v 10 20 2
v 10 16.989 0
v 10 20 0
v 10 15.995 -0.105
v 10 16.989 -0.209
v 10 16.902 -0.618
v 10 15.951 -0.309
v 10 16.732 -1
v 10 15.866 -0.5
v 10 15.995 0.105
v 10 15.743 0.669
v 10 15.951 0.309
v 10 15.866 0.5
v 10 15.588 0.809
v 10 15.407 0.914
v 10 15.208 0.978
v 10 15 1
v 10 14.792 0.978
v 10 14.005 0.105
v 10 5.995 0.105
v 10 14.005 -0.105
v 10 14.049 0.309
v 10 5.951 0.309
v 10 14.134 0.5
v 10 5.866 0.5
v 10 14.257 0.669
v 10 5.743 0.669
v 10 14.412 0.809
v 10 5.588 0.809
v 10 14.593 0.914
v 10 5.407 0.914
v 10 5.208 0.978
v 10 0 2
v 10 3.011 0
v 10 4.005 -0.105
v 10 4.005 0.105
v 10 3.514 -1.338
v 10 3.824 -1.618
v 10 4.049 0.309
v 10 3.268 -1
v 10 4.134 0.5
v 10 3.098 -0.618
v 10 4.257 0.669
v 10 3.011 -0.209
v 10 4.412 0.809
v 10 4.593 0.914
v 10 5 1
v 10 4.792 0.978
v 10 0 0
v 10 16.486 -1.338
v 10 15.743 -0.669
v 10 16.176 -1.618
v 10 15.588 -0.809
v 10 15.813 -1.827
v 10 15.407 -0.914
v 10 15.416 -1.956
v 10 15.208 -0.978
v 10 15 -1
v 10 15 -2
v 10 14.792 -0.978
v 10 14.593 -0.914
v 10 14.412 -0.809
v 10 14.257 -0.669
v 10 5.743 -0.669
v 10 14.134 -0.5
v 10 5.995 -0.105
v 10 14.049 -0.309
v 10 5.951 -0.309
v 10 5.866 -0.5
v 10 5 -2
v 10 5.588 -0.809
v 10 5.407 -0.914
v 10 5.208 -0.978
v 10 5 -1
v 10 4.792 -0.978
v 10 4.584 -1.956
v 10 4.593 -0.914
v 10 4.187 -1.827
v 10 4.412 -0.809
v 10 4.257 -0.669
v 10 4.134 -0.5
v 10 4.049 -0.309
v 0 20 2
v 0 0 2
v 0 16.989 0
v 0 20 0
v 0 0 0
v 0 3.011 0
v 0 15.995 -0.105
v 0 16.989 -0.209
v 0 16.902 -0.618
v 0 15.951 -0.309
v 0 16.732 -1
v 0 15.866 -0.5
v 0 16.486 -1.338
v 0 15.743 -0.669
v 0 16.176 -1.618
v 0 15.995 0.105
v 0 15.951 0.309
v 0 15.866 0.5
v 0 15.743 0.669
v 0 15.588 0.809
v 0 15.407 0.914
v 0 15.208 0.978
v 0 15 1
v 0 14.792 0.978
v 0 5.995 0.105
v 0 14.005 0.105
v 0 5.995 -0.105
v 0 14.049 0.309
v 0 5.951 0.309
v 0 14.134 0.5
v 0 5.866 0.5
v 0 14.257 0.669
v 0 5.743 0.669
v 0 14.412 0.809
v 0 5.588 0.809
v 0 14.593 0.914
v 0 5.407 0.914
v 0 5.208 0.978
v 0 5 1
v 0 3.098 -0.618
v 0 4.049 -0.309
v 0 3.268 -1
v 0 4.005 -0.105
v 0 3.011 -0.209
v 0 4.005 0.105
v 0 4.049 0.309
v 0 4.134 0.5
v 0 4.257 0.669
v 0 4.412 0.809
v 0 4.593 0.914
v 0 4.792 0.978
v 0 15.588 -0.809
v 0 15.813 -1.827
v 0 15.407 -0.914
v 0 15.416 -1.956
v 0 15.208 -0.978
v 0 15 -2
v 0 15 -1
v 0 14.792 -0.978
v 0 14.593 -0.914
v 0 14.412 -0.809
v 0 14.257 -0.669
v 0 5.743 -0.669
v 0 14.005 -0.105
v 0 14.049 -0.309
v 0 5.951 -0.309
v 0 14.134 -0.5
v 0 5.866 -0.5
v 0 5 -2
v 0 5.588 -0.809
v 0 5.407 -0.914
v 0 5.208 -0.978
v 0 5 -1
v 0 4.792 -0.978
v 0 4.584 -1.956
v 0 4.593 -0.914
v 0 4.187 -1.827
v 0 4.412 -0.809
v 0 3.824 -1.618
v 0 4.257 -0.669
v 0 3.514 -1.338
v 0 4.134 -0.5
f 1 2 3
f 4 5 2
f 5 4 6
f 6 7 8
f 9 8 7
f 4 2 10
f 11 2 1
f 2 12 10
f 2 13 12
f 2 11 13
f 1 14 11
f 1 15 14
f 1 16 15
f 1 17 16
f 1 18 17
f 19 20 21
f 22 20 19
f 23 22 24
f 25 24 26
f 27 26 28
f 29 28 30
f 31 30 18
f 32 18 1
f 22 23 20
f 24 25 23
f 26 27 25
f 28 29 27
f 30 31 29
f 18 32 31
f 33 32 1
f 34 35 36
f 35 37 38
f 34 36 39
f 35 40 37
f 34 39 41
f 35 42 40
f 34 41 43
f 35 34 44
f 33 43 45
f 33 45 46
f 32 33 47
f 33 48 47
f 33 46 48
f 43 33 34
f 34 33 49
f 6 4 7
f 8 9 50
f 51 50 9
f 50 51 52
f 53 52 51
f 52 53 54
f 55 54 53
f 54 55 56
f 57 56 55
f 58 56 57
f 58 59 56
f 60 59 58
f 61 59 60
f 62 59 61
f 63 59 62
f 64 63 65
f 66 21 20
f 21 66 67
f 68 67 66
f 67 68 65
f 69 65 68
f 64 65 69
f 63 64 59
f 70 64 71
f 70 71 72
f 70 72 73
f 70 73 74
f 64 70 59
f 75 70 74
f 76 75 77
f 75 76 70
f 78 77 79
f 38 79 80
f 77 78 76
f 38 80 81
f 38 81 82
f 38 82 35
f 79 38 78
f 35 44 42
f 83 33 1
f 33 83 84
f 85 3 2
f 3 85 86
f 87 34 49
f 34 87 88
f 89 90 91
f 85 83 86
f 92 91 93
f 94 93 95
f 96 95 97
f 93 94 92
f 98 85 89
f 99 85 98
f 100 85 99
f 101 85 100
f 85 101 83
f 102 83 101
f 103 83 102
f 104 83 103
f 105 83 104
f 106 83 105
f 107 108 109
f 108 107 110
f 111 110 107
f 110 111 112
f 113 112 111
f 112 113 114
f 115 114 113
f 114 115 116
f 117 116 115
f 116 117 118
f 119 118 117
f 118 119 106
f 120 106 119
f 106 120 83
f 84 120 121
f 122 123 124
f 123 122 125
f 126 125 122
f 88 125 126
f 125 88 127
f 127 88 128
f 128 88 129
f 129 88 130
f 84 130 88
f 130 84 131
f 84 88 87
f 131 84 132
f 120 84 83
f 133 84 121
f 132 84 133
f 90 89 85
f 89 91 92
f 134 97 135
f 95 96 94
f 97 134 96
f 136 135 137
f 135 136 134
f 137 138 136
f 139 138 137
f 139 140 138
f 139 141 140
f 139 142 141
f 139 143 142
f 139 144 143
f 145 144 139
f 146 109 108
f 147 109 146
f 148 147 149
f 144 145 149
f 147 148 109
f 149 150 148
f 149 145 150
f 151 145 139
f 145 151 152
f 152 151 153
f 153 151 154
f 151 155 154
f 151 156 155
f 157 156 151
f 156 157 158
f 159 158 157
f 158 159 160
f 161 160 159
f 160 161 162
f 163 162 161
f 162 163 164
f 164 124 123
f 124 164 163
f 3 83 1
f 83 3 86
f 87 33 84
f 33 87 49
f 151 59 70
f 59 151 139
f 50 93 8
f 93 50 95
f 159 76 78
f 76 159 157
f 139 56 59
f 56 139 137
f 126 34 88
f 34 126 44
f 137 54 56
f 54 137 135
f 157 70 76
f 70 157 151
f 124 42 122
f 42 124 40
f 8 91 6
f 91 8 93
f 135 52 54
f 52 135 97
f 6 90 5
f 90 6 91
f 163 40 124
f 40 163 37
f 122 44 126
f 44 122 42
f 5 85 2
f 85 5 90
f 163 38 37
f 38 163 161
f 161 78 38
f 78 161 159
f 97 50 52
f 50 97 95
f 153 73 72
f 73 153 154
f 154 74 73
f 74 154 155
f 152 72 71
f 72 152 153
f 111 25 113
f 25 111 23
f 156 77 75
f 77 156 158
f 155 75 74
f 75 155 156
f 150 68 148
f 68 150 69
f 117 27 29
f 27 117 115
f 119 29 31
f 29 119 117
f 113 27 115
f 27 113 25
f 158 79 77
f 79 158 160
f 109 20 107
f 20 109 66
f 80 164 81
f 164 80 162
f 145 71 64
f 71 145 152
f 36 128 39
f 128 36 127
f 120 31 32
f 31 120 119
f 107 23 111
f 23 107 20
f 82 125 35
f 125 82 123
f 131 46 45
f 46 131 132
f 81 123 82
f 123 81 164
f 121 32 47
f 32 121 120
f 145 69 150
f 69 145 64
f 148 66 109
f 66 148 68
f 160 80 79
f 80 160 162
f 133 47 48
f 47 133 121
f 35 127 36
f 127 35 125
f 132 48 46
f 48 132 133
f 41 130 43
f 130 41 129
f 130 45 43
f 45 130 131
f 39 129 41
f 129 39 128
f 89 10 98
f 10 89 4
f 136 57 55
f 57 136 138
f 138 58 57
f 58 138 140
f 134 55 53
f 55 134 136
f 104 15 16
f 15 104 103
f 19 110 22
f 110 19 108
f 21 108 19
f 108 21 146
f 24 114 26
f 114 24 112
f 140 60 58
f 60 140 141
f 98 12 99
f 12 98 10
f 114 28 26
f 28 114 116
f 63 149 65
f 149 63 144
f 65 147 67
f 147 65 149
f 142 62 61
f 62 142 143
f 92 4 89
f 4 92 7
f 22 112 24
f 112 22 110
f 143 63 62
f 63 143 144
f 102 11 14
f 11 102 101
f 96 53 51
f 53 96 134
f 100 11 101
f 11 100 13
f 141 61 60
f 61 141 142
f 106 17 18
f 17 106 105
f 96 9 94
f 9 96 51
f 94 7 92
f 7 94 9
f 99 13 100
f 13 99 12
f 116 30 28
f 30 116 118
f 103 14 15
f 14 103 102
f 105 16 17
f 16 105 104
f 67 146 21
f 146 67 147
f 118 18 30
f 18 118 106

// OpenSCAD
$fn=30;
difference(){
union(){
cube([10,20,2]);
translate([0,5,0])rotate([0,90,0])
hull(){
cylinder(d=4,h=10);
translate([0,10,0])cylinder(d=4,h=10);
}
}
translate([0,5,0])rotate([0,90,0])
{
translate([0,0,-1])cylinder(d=2,h=12);
translate([0,10,-1])cylinder(d=2,h=12);
}
}
